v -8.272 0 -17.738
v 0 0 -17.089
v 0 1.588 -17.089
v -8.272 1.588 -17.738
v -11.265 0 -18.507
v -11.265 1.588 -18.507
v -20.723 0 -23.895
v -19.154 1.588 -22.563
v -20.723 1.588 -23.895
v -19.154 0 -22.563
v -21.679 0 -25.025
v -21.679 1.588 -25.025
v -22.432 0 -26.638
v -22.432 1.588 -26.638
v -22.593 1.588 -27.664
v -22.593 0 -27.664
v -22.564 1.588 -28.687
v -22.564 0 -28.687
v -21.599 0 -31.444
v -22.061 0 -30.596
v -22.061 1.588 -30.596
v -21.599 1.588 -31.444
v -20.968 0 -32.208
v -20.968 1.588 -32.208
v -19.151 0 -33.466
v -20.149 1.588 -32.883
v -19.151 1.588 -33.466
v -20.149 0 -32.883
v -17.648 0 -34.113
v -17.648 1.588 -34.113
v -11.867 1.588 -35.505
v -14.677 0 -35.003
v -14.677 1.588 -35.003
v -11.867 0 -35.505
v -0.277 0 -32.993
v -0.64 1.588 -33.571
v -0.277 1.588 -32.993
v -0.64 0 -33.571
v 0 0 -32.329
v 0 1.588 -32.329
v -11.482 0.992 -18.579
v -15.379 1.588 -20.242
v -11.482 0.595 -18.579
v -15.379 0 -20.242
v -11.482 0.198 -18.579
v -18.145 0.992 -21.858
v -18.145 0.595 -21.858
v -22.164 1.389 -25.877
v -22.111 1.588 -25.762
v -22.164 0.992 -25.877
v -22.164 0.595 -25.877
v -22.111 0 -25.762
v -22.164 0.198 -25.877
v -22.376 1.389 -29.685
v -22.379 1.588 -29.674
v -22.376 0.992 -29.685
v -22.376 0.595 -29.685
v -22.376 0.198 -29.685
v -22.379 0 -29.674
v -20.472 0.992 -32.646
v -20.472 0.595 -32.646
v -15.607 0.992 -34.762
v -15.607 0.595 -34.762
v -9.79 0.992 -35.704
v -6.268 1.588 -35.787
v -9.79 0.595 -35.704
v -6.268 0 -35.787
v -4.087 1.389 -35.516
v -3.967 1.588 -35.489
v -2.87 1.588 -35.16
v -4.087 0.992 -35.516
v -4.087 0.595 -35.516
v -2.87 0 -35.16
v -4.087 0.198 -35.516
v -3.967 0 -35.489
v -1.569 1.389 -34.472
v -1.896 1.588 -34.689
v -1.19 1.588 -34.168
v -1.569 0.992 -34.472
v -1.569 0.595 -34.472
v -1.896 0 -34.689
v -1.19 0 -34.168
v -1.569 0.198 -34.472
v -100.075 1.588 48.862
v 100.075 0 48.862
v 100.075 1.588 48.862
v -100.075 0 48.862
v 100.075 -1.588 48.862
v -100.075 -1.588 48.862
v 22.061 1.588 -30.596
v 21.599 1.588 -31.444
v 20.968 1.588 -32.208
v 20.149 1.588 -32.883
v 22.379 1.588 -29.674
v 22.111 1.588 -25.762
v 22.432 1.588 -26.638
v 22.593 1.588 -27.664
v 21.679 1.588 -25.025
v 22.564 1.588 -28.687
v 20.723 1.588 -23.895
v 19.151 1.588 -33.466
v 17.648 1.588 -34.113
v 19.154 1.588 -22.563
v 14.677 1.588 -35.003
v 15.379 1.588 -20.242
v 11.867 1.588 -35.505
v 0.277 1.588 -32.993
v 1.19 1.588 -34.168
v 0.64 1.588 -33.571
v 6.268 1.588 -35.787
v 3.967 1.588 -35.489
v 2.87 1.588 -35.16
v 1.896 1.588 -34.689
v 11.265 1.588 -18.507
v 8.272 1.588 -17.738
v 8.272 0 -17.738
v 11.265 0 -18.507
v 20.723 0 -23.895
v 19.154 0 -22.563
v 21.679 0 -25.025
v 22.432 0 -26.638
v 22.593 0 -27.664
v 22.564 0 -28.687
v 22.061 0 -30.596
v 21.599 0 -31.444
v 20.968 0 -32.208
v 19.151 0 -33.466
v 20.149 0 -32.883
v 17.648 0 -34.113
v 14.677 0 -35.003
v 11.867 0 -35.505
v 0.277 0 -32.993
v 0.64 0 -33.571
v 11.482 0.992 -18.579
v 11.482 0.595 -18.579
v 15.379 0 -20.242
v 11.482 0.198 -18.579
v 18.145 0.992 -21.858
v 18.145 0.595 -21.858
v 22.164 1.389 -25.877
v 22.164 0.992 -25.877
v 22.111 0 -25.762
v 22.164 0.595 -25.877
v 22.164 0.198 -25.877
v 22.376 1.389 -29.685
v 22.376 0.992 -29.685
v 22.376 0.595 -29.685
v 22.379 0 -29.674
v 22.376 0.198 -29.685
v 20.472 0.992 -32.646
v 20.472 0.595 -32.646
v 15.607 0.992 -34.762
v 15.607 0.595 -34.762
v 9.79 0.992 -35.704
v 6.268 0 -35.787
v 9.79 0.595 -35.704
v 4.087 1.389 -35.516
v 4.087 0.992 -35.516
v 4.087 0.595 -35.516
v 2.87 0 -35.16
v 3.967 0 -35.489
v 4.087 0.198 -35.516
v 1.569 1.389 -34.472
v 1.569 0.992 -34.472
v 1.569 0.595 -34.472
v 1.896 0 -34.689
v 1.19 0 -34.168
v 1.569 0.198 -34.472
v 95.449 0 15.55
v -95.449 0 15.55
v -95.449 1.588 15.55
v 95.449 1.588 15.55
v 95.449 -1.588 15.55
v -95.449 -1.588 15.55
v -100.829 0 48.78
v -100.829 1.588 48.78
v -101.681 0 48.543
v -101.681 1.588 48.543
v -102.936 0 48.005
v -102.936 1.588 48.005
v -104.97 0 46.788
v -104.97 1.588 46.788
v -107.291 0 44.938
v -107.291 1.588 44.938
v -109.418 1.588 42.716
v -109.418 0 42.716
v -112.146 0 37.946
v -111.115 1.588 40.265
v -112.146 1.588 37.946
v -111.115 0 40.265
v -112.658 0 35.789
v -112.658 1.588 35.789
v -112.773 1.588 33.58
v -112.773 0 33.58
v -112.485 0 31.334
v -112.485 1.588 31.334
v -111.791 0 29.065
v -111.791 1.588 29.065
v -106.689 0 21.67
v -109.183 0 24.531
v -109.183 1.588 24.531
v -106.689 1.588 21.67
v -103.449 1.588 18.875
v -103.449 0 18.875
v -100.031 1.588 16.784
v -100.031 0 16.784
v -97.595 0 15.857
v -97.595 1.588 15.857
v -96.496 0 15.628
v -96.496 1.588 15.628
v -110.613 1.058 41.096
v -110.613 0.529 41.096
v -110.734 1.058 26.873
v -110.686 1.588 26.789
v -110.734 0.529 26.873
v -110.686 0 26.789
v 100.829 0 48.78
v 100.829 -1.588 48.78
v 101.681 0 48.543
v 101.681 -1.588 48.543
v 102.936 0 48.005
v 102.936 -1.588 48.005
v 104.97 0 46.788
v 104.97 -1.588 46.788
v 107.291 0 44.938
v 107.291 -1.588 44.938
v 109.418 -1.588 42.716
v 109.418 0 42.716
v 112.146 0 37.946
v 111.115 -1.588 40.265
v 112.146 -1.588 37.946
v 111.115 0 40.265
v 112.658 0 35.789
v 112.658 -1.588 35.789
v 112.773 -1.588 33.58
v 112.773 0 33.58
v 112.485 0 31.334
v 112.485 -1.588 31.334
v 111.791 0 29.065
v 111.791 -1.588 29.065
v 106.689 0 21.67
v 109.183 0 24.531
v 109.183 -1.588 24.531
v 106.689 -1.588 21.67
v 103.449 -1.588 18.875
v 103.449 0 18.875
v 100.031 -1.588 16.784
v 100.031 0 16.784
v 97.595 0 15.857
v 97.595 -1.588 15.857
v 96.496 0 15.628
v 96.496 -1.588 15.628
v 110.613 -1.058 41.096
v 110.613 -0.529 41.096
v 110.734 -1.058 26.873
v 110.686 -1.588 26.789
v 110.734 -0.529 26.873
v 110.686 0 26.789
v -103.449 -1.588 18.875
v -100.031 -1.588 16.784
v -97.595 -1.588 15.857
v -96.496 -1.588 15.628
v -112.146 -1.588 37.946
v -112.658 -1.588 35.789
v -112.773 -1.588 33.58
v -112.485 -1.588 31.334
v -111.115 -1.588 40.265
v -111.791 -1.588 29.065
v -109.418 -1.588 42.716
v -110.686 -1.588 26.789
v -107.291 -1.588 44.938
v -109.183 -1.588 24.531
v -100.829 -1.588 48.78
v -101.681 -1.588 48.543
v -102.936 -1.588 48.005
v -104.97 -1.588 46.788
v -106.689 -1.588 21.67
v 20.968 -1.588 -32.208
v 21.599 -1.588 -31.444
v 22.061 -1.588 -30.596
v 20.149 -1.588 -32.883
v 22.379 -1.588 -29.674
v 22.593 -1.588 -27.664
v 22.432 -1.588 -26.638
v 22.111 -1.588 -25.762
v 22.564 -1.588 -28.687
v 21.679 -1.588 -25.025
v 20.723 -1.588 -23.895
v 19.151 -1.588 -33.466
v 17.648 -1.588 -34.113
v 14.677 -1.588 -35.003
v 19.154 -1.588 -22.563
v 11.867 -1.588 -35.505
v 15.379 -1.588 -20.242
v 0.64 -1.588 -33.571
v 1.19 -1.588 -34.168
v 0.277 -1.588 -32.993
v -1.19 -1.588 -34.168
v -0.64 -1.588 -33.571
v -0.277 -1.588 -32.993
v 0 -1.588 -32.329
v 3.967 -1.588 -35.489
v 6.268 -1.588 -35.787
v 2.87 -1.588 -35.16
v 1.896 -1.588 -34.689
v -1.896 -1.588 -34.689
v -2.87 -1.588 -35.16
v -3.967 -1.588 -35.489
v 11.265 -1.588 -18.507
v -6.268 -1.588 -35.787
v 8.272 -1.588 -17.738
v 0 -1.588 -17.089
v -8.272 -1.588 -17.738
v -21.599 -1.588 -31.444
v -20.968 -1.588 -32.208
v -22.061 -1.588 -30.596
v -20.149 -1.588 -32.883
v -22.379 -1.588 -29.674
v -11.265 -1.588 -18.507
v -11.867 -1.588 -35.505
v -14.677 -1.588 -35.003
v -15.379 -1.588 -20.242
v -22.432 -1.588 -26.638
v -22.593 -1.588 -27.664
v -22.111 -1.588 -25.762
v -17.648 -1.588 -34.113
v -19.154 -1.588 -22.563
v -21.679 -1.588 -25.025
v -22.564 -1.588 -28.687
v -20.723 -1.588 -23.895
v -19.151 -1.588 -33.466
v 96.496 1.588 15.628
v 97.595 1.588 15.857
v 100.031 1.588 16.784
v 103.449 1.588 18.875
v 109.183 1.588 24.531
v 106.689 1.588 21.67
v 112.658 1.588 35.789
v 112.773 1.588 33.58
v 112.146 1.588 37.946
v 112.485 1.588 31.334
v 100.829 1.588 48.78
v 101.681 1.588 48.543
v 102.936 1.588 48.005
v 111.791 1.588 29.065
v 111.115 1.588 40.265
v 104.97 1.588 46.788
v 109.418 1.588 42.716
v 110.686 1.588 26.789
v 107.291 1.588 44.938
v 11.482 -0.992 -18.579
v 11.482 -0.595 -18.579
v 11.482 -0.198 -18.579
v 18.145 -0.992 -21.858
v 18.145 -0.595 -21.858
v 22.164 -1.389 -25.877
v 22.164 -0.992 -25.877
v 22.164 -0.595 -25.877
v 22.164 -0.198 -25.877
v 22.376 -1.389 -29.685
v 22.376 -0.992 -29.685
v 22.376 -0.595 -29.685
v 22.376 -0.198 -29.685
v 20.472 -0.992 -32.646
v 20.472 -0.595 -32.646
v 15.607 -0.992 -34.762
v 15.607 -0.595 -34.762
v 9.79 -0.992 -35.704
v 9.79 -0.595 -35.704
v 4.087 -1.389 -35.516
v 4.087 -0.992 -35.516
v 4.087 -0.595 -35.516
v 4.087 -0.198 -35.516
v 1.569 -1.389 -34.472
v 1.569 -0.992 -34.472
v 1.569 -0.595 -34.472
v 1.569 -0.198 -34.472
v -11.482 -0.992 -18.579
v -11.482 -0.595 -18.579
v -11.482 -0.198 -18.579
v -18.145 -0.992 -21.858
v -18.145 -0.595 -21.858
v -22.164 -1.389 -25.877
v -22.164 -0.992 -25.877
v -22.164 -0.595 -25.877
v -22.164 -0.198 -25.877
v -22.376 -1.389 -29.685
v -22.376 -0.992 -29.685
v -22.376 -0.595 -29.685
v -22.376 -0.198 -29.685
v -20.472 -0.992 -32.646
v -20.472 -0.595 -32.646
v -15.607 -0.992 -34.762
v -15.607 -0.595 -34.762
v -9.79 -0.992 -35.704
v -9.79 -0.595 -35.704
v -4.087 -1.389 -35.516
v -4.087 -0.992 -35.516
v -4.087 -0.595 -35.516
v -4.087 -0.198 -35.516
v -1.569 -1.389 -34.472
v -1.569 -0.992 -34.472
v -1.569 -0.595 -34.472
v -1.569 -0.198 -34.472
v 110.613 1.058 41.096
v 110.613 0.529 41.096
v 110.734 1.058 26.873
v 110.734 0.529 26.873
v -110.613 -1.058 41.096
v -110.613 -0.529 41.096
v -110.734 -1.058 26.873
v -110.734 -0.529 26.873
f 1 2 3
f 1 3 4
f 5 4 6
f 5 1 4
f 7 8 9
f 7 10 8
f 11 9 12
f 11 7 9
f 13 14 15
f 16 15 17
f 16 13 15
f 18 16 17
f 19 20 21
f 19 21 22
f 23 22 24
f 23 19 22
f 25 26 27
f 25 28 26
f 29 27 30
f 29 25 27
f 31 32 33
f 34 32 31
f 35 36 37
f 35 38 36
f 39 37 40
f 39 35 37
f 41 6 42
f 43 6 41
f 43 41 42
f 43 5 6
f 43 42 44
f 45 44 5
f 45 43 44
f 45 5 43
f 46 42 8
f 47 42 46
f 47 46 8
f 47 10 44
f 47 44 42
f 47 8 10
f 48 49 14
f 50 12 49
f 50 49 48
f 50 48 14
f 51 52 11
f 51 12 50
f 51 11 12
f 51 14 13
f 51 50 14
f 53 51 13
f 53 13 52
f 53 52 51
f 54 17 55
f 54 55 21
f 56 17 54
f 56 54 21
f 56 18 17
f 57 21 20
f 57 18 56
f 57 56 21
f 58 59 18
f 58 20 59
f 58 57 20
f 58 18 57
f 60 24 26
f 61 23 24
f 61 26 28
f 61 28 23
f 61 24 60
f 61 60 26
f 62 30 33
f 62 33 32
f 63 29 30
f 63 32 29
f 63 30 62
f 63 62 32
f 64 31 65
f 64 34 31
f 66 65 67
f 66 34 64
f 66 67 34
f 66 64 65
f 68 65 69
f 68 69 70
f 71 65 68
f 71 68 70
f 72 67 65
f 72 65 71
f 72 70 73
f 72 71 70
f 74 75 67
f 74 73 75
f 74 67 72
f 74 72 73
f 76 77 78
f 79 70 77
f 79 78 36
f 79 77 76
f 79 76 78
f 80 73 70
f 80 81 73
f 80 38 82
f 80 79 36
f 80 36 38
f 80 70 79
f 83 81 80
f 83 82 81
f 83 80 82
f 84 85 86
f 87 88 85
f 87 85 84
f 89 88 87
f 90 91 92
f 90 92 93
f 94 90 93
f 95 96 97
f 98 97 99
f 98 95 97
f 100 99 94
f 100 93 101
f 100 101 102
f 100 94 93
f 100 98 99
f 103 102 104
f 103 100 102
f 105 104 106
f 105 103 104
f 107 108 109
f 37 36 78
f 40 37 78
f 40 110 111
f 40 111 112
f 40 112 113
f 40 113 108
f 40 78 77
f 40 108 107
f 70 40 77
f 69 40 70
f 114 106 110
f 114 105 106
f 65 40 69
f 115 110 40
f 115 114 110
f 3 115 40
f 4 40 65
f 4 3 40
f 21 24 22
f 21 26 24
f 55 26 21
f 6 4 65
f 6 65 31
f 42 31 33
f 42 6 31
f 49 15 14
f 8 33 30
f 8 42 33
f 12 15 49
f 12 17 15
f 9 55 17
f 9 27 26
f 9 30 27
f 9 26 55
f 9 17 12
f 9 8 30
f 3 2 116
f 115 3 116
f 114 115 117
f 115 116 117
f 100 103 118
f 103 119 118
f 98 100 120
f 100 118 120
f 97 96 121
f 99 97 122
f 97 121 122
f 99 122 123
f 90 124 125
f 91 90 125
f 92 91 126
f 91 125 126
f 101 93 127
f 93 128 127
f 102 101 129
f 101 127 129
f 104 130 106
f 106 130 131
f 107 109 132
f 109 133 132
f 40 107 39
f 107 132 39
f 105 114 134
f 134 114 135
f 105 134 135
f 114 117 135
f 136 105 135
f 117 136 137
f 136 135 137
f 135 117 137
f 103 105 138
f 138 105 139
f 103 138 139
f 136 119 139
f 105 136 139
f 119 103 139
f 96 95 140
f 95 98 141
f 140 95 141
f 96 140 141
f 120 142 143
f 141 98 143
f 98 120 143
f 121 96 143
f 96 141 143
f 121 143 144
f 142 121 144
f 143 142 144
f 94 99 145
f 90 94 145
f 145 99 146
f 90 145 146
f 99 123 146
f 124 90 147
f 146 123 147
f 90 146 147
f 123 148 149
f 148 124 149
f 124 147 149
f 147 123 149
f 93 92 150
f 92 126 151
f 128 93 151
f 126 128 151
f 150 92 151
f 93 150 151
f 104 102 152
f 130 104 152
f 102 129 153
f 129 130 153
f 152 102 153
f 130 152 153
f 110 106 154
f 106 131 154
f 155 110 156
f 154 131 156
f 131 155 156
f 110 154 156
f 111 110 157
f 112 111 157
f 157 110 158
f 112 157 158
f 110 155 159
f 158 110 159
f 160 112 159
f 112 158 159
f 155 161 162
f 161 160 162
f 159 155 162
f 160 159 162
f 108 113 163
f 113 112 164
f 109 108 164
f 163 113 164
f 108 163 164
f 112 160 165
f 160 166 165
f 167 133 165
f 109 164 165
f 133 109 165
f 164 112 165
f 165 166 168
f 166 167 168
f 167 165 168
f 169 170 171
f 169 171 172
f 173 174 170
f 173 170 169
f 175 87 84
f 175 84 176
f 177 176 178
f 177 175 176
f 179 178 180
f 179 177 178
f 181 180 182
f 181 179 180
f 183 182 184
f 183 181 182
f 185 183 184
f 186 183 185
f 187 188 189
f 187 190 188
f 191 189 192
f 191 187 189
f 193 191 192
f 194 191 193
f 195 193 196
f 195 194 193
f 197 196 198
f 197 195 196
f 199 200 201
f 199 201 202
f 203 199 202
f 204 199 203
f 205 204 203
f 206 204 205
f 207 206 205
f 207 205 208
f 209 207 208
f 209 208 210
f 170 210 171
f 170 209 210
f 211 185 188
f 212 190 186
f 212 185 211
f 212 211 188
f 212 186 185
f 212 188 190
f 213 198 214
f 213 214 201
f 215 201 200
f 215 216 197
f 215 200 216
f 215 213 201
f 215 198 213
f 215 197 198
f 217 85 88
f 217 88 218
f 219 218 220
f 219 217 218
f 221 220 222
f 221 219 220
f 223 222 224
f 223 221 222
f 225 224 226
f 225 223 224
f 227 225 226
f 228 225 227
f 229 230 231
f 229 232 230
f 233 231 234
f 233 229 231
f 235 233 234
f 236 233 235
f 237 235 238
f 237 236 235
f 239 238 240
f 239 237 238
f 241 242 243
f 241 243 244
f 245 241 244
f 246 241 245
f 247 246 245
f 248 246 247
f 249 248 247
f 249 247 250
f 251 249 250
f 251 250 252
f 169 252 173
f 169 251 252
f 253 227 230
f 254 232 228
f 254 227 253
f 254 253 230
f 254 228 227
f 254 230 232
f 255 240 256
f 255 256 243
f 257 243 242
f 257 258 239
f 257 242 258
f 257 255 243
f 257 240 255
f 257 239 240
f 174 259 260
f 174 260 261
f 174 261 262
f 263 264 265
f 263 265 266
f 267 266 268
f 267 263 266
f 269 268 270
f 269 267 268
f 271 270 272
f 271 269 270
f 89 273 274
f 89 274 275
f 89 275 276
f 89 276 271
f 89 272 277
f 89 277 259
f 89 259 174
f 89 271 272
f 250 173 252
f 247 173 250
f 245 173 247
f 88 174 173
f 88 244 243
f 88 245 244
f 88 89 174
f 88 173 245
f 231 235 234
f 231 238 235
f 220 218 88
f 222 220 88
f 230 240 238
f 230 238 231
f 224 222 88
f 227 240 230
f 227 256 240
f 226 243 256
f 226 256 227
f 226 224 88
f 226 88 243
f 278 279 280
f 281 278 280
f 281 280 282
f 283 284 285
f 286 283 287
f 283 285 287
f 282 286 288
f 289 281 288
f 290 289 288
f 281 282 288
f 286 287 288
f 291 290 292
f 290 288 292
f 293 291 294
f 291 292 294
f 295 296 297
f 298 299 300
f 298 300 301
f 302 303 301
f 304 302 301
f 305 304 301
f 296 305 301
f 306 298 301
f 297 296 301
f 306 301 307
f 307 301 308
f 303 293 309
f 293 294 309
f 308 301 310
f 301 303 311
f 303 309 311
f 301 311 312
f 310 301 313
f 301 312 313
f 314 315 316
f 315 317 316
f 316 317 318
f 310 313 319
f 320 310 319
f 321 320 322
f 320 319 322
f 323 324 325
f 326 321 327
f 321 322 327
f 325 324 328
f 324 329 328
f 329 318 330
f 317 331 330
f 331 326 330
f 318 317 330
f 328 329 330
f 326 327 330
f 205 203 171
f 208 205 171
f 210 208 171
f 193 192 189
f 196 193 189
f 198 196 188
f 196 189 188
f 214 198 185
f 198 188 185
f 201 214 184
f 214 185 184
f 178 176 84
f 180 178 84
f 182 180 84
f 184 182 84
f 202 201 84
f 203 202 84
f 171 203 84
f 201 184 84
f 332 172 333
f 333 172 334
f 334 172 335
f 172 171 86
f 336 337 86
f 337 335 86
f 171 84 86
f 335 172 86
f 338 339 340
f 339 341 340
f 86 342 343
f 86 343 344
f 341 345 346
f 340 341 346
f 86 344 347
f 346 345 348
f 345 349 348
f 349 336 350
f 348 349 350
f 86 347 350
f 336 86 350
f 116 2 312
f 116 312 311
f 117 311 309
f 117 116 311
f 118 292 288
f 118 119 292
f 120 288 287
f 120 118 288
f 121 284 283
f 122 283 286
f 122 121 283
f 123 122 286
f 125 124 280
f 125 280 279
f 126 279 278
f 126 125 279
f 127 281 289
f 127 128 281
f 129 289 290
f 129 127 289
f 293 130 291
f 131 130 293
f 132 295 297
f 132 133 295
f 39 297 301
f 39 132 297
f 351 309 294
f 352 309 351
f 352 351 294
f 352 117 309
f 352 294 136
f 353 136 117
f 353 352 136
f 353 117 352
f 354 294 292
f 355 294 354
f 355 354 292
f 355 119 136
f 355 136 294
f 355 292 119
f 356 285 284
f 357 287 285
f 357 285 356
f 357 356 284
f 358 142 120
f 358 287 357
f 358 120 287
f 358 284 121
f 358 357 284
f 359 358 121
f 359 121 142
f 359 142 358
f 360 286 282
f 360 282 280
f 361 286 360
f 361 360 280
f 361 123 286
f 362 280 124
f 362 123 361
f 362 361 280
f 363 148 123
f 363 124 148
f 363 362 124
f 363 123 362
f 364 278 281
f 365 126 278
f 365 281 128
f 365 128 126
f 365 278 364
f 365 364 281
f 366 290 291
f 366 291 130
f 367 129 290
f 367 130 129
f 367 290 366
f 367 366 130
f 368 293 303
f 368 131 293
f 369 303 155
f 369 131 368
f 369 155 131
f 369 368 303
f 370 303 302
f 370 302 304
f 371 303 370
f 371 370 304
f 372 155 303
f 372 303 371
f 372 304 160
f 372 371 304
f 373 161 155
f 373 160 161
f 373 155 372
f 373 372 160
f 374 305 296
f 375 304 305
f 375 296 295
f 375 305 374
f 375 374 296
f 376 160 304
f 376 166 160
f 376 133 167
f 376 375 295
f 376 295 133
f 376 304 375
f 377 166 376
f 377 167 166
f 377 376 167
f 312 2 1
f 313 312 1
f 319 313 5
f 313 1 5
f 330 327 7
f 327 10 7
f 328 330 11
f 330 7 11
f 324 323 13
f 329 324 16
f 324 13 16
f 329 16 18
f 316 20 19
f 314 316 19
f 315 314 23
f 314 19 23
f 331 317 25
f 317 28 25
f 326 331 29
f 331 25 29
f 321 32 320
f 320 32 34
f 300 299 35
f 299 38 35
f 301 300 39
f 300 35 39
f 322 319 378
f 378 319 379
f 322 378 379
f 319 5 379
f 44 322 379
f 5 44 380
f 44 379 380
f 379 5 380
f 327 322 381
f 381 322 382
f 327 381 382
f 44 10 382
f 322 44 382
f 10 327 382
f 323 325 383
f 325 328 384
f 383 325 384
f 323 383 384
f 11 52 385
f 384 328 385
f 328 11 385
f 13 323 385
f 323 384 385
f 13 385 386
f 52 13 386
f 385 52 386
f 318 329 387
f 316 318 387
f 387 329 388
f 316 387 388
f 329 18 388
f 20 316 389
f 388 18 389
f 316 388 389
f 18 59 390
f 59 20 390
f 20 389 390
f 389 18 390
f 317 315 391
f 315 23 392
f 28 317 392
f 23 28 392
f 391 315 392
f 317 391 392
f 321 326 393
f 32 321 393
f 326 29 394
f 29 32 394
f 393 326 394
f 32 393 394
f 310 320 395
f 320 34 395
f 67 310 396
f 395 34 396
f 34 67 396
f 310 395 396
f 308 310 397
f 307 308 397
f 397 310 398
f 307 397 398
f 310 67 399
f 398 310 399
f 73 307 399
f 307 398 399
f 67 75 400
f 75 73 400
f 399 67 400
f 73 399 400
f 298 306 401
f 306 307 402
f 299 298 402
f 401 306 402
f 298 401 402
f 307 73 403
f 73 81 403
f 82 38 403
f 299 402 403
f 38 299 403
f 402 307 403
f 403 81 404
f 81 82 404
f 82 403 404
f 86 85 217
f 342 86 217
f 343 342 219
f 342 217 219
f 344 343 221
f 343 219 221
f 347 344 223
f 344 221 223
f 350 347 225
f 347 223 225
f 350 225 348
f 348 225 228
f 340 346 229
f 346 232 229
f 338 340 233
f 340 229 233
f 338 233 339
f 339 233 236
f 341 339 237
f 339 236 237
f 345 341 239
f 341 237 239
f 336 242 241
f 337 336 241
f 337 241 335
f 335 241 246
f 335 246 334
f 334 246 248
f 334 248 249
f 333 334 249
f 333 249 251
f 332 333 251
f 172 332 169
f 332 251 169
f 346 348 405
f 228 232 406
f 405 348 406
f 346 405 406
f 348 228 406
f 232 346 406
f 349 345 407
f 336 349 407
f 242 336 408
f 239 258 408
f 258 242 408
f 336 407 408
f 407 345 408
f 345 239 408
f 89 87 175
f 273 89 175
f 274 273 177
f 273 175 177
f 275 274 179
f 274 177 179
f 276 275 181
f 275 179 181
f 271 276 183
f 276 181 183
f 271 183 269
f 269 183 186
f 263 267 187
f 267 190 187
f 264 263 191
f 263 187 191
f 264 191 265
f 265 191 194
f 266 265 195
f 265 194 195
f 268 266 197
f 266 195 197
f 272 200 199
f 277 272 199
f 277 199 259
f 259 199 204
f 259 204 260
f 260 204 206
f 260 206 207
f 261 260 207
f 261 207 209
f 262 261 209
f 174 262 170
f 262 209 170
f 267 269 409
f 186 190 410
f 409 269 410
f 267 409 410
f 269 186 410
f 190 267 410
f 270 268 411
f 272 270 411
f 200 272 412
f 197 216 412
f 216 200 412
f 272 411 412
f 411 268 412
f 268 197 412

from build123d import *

# Parameters (mm, degrees)
F1_DEPTH = 1.5875


with BuildPart() as f1:
    # F0 (on Front) → F1 (new body, symmetric)
    with BuildSketch(Plane.XZ):
        with BuildLine():
            Line((-95.4491645098, 15.5498979571), (0, 15.5498979571))
            Line((0, 15.5498979571), (95.4491645098, 15.5498979571))
            add(Edge.make_bspline(
                [(100.0751927495, 48.8619215745), (102.7090887615, 48.8619215745), (113.3303219, 41.51151007), (113.6572843251, 26.0564992665), (100.3678366542, 15.5498979571), (95.4491645098, 15.5498979571)],
                knots=[0, 0, 0, 0, 0.3078920629, 0.628836659, 1, 1, 1, 1], degree=3))
            Line((100.0751927495, 48.8619215745), (0, 48.8619215745))
            Line((0, 48.8619215745), (-100.0751927495, 48.8619215745))
            add(Edge.make_bspline(
                [(-100.0751927495, 48.8619215745), (-102.7090887615, 48.8619215745), (-113.3303219, 41.51151007), (-113.6572843251, 26.0564992665), (-100.3678366542, 15.5498979571), (-95.4491645098, 15.5498979571)],
                knots=[0, 0, 0, 0, 0.3078920629, 0.628836659, 1, 1, 1, 1], degree=3))
        make_face()
    extrude(amount=F1_DEPTH, both=True)


with BuildPart() as f1b:
    # F0 (on Front) → F1, piece 2 (new body, symmetric)
    with BuildSketch(Plane.XZ):
        with BuildLine():
            add(Edge.make_bspline(
                [(0, -17.0887019485), (5.7795476168, -17.2010064125), (10.8758950079, -17.9249138286), (18.1463837268, -21.5184543585), (22.7572152407, -25.4510018388), (22.6678741497, -29.7933182332), (20.7879752369, -33.0823305942), (15.2574218762, -35.0022667544), (10.3430421268, -35.8624297698), (1.2167258005, -36.0765912032), (0, -32.3287019485)],
                knots=[0, 0, 0, 0, 0.1677043693, 0.302014212, 0.4195162375, 0.5157620853, 0.6082384885, 0.7217588447, 0.8414018211, 1, 1, 1, 1], degree=3))
            add(Edge.make_bspline(
                [(0, -17.0887019485), (-5.7795476168, -17.2010064125), (-10.8758950079, -17.9249138286), (-18.1463837268, -21.5184543585), (-22.7572152407, -25.4510018388), (-22.6678741497, -29.7933182332), (-20.7879752369, -33.0823305942), (-15.2574218762, -35.0022667544), (-10.3430421268, -35.8624297698), (-1.2167258005, -36.0765912032), (0, -32.3287019485)],
                knots=[0, 0, 0, 0, 0.1677043693, 0.302014212, 0.4195162375, 0.5157620853, 0.6082384885, 0.7217588447, 0.8414018211, 1, 1, 1, 1], degree=3))
        make_face()
    extrude(amount=F1_DEPTH, both=True)


solid = Compound([f1.part, f1b.part])
